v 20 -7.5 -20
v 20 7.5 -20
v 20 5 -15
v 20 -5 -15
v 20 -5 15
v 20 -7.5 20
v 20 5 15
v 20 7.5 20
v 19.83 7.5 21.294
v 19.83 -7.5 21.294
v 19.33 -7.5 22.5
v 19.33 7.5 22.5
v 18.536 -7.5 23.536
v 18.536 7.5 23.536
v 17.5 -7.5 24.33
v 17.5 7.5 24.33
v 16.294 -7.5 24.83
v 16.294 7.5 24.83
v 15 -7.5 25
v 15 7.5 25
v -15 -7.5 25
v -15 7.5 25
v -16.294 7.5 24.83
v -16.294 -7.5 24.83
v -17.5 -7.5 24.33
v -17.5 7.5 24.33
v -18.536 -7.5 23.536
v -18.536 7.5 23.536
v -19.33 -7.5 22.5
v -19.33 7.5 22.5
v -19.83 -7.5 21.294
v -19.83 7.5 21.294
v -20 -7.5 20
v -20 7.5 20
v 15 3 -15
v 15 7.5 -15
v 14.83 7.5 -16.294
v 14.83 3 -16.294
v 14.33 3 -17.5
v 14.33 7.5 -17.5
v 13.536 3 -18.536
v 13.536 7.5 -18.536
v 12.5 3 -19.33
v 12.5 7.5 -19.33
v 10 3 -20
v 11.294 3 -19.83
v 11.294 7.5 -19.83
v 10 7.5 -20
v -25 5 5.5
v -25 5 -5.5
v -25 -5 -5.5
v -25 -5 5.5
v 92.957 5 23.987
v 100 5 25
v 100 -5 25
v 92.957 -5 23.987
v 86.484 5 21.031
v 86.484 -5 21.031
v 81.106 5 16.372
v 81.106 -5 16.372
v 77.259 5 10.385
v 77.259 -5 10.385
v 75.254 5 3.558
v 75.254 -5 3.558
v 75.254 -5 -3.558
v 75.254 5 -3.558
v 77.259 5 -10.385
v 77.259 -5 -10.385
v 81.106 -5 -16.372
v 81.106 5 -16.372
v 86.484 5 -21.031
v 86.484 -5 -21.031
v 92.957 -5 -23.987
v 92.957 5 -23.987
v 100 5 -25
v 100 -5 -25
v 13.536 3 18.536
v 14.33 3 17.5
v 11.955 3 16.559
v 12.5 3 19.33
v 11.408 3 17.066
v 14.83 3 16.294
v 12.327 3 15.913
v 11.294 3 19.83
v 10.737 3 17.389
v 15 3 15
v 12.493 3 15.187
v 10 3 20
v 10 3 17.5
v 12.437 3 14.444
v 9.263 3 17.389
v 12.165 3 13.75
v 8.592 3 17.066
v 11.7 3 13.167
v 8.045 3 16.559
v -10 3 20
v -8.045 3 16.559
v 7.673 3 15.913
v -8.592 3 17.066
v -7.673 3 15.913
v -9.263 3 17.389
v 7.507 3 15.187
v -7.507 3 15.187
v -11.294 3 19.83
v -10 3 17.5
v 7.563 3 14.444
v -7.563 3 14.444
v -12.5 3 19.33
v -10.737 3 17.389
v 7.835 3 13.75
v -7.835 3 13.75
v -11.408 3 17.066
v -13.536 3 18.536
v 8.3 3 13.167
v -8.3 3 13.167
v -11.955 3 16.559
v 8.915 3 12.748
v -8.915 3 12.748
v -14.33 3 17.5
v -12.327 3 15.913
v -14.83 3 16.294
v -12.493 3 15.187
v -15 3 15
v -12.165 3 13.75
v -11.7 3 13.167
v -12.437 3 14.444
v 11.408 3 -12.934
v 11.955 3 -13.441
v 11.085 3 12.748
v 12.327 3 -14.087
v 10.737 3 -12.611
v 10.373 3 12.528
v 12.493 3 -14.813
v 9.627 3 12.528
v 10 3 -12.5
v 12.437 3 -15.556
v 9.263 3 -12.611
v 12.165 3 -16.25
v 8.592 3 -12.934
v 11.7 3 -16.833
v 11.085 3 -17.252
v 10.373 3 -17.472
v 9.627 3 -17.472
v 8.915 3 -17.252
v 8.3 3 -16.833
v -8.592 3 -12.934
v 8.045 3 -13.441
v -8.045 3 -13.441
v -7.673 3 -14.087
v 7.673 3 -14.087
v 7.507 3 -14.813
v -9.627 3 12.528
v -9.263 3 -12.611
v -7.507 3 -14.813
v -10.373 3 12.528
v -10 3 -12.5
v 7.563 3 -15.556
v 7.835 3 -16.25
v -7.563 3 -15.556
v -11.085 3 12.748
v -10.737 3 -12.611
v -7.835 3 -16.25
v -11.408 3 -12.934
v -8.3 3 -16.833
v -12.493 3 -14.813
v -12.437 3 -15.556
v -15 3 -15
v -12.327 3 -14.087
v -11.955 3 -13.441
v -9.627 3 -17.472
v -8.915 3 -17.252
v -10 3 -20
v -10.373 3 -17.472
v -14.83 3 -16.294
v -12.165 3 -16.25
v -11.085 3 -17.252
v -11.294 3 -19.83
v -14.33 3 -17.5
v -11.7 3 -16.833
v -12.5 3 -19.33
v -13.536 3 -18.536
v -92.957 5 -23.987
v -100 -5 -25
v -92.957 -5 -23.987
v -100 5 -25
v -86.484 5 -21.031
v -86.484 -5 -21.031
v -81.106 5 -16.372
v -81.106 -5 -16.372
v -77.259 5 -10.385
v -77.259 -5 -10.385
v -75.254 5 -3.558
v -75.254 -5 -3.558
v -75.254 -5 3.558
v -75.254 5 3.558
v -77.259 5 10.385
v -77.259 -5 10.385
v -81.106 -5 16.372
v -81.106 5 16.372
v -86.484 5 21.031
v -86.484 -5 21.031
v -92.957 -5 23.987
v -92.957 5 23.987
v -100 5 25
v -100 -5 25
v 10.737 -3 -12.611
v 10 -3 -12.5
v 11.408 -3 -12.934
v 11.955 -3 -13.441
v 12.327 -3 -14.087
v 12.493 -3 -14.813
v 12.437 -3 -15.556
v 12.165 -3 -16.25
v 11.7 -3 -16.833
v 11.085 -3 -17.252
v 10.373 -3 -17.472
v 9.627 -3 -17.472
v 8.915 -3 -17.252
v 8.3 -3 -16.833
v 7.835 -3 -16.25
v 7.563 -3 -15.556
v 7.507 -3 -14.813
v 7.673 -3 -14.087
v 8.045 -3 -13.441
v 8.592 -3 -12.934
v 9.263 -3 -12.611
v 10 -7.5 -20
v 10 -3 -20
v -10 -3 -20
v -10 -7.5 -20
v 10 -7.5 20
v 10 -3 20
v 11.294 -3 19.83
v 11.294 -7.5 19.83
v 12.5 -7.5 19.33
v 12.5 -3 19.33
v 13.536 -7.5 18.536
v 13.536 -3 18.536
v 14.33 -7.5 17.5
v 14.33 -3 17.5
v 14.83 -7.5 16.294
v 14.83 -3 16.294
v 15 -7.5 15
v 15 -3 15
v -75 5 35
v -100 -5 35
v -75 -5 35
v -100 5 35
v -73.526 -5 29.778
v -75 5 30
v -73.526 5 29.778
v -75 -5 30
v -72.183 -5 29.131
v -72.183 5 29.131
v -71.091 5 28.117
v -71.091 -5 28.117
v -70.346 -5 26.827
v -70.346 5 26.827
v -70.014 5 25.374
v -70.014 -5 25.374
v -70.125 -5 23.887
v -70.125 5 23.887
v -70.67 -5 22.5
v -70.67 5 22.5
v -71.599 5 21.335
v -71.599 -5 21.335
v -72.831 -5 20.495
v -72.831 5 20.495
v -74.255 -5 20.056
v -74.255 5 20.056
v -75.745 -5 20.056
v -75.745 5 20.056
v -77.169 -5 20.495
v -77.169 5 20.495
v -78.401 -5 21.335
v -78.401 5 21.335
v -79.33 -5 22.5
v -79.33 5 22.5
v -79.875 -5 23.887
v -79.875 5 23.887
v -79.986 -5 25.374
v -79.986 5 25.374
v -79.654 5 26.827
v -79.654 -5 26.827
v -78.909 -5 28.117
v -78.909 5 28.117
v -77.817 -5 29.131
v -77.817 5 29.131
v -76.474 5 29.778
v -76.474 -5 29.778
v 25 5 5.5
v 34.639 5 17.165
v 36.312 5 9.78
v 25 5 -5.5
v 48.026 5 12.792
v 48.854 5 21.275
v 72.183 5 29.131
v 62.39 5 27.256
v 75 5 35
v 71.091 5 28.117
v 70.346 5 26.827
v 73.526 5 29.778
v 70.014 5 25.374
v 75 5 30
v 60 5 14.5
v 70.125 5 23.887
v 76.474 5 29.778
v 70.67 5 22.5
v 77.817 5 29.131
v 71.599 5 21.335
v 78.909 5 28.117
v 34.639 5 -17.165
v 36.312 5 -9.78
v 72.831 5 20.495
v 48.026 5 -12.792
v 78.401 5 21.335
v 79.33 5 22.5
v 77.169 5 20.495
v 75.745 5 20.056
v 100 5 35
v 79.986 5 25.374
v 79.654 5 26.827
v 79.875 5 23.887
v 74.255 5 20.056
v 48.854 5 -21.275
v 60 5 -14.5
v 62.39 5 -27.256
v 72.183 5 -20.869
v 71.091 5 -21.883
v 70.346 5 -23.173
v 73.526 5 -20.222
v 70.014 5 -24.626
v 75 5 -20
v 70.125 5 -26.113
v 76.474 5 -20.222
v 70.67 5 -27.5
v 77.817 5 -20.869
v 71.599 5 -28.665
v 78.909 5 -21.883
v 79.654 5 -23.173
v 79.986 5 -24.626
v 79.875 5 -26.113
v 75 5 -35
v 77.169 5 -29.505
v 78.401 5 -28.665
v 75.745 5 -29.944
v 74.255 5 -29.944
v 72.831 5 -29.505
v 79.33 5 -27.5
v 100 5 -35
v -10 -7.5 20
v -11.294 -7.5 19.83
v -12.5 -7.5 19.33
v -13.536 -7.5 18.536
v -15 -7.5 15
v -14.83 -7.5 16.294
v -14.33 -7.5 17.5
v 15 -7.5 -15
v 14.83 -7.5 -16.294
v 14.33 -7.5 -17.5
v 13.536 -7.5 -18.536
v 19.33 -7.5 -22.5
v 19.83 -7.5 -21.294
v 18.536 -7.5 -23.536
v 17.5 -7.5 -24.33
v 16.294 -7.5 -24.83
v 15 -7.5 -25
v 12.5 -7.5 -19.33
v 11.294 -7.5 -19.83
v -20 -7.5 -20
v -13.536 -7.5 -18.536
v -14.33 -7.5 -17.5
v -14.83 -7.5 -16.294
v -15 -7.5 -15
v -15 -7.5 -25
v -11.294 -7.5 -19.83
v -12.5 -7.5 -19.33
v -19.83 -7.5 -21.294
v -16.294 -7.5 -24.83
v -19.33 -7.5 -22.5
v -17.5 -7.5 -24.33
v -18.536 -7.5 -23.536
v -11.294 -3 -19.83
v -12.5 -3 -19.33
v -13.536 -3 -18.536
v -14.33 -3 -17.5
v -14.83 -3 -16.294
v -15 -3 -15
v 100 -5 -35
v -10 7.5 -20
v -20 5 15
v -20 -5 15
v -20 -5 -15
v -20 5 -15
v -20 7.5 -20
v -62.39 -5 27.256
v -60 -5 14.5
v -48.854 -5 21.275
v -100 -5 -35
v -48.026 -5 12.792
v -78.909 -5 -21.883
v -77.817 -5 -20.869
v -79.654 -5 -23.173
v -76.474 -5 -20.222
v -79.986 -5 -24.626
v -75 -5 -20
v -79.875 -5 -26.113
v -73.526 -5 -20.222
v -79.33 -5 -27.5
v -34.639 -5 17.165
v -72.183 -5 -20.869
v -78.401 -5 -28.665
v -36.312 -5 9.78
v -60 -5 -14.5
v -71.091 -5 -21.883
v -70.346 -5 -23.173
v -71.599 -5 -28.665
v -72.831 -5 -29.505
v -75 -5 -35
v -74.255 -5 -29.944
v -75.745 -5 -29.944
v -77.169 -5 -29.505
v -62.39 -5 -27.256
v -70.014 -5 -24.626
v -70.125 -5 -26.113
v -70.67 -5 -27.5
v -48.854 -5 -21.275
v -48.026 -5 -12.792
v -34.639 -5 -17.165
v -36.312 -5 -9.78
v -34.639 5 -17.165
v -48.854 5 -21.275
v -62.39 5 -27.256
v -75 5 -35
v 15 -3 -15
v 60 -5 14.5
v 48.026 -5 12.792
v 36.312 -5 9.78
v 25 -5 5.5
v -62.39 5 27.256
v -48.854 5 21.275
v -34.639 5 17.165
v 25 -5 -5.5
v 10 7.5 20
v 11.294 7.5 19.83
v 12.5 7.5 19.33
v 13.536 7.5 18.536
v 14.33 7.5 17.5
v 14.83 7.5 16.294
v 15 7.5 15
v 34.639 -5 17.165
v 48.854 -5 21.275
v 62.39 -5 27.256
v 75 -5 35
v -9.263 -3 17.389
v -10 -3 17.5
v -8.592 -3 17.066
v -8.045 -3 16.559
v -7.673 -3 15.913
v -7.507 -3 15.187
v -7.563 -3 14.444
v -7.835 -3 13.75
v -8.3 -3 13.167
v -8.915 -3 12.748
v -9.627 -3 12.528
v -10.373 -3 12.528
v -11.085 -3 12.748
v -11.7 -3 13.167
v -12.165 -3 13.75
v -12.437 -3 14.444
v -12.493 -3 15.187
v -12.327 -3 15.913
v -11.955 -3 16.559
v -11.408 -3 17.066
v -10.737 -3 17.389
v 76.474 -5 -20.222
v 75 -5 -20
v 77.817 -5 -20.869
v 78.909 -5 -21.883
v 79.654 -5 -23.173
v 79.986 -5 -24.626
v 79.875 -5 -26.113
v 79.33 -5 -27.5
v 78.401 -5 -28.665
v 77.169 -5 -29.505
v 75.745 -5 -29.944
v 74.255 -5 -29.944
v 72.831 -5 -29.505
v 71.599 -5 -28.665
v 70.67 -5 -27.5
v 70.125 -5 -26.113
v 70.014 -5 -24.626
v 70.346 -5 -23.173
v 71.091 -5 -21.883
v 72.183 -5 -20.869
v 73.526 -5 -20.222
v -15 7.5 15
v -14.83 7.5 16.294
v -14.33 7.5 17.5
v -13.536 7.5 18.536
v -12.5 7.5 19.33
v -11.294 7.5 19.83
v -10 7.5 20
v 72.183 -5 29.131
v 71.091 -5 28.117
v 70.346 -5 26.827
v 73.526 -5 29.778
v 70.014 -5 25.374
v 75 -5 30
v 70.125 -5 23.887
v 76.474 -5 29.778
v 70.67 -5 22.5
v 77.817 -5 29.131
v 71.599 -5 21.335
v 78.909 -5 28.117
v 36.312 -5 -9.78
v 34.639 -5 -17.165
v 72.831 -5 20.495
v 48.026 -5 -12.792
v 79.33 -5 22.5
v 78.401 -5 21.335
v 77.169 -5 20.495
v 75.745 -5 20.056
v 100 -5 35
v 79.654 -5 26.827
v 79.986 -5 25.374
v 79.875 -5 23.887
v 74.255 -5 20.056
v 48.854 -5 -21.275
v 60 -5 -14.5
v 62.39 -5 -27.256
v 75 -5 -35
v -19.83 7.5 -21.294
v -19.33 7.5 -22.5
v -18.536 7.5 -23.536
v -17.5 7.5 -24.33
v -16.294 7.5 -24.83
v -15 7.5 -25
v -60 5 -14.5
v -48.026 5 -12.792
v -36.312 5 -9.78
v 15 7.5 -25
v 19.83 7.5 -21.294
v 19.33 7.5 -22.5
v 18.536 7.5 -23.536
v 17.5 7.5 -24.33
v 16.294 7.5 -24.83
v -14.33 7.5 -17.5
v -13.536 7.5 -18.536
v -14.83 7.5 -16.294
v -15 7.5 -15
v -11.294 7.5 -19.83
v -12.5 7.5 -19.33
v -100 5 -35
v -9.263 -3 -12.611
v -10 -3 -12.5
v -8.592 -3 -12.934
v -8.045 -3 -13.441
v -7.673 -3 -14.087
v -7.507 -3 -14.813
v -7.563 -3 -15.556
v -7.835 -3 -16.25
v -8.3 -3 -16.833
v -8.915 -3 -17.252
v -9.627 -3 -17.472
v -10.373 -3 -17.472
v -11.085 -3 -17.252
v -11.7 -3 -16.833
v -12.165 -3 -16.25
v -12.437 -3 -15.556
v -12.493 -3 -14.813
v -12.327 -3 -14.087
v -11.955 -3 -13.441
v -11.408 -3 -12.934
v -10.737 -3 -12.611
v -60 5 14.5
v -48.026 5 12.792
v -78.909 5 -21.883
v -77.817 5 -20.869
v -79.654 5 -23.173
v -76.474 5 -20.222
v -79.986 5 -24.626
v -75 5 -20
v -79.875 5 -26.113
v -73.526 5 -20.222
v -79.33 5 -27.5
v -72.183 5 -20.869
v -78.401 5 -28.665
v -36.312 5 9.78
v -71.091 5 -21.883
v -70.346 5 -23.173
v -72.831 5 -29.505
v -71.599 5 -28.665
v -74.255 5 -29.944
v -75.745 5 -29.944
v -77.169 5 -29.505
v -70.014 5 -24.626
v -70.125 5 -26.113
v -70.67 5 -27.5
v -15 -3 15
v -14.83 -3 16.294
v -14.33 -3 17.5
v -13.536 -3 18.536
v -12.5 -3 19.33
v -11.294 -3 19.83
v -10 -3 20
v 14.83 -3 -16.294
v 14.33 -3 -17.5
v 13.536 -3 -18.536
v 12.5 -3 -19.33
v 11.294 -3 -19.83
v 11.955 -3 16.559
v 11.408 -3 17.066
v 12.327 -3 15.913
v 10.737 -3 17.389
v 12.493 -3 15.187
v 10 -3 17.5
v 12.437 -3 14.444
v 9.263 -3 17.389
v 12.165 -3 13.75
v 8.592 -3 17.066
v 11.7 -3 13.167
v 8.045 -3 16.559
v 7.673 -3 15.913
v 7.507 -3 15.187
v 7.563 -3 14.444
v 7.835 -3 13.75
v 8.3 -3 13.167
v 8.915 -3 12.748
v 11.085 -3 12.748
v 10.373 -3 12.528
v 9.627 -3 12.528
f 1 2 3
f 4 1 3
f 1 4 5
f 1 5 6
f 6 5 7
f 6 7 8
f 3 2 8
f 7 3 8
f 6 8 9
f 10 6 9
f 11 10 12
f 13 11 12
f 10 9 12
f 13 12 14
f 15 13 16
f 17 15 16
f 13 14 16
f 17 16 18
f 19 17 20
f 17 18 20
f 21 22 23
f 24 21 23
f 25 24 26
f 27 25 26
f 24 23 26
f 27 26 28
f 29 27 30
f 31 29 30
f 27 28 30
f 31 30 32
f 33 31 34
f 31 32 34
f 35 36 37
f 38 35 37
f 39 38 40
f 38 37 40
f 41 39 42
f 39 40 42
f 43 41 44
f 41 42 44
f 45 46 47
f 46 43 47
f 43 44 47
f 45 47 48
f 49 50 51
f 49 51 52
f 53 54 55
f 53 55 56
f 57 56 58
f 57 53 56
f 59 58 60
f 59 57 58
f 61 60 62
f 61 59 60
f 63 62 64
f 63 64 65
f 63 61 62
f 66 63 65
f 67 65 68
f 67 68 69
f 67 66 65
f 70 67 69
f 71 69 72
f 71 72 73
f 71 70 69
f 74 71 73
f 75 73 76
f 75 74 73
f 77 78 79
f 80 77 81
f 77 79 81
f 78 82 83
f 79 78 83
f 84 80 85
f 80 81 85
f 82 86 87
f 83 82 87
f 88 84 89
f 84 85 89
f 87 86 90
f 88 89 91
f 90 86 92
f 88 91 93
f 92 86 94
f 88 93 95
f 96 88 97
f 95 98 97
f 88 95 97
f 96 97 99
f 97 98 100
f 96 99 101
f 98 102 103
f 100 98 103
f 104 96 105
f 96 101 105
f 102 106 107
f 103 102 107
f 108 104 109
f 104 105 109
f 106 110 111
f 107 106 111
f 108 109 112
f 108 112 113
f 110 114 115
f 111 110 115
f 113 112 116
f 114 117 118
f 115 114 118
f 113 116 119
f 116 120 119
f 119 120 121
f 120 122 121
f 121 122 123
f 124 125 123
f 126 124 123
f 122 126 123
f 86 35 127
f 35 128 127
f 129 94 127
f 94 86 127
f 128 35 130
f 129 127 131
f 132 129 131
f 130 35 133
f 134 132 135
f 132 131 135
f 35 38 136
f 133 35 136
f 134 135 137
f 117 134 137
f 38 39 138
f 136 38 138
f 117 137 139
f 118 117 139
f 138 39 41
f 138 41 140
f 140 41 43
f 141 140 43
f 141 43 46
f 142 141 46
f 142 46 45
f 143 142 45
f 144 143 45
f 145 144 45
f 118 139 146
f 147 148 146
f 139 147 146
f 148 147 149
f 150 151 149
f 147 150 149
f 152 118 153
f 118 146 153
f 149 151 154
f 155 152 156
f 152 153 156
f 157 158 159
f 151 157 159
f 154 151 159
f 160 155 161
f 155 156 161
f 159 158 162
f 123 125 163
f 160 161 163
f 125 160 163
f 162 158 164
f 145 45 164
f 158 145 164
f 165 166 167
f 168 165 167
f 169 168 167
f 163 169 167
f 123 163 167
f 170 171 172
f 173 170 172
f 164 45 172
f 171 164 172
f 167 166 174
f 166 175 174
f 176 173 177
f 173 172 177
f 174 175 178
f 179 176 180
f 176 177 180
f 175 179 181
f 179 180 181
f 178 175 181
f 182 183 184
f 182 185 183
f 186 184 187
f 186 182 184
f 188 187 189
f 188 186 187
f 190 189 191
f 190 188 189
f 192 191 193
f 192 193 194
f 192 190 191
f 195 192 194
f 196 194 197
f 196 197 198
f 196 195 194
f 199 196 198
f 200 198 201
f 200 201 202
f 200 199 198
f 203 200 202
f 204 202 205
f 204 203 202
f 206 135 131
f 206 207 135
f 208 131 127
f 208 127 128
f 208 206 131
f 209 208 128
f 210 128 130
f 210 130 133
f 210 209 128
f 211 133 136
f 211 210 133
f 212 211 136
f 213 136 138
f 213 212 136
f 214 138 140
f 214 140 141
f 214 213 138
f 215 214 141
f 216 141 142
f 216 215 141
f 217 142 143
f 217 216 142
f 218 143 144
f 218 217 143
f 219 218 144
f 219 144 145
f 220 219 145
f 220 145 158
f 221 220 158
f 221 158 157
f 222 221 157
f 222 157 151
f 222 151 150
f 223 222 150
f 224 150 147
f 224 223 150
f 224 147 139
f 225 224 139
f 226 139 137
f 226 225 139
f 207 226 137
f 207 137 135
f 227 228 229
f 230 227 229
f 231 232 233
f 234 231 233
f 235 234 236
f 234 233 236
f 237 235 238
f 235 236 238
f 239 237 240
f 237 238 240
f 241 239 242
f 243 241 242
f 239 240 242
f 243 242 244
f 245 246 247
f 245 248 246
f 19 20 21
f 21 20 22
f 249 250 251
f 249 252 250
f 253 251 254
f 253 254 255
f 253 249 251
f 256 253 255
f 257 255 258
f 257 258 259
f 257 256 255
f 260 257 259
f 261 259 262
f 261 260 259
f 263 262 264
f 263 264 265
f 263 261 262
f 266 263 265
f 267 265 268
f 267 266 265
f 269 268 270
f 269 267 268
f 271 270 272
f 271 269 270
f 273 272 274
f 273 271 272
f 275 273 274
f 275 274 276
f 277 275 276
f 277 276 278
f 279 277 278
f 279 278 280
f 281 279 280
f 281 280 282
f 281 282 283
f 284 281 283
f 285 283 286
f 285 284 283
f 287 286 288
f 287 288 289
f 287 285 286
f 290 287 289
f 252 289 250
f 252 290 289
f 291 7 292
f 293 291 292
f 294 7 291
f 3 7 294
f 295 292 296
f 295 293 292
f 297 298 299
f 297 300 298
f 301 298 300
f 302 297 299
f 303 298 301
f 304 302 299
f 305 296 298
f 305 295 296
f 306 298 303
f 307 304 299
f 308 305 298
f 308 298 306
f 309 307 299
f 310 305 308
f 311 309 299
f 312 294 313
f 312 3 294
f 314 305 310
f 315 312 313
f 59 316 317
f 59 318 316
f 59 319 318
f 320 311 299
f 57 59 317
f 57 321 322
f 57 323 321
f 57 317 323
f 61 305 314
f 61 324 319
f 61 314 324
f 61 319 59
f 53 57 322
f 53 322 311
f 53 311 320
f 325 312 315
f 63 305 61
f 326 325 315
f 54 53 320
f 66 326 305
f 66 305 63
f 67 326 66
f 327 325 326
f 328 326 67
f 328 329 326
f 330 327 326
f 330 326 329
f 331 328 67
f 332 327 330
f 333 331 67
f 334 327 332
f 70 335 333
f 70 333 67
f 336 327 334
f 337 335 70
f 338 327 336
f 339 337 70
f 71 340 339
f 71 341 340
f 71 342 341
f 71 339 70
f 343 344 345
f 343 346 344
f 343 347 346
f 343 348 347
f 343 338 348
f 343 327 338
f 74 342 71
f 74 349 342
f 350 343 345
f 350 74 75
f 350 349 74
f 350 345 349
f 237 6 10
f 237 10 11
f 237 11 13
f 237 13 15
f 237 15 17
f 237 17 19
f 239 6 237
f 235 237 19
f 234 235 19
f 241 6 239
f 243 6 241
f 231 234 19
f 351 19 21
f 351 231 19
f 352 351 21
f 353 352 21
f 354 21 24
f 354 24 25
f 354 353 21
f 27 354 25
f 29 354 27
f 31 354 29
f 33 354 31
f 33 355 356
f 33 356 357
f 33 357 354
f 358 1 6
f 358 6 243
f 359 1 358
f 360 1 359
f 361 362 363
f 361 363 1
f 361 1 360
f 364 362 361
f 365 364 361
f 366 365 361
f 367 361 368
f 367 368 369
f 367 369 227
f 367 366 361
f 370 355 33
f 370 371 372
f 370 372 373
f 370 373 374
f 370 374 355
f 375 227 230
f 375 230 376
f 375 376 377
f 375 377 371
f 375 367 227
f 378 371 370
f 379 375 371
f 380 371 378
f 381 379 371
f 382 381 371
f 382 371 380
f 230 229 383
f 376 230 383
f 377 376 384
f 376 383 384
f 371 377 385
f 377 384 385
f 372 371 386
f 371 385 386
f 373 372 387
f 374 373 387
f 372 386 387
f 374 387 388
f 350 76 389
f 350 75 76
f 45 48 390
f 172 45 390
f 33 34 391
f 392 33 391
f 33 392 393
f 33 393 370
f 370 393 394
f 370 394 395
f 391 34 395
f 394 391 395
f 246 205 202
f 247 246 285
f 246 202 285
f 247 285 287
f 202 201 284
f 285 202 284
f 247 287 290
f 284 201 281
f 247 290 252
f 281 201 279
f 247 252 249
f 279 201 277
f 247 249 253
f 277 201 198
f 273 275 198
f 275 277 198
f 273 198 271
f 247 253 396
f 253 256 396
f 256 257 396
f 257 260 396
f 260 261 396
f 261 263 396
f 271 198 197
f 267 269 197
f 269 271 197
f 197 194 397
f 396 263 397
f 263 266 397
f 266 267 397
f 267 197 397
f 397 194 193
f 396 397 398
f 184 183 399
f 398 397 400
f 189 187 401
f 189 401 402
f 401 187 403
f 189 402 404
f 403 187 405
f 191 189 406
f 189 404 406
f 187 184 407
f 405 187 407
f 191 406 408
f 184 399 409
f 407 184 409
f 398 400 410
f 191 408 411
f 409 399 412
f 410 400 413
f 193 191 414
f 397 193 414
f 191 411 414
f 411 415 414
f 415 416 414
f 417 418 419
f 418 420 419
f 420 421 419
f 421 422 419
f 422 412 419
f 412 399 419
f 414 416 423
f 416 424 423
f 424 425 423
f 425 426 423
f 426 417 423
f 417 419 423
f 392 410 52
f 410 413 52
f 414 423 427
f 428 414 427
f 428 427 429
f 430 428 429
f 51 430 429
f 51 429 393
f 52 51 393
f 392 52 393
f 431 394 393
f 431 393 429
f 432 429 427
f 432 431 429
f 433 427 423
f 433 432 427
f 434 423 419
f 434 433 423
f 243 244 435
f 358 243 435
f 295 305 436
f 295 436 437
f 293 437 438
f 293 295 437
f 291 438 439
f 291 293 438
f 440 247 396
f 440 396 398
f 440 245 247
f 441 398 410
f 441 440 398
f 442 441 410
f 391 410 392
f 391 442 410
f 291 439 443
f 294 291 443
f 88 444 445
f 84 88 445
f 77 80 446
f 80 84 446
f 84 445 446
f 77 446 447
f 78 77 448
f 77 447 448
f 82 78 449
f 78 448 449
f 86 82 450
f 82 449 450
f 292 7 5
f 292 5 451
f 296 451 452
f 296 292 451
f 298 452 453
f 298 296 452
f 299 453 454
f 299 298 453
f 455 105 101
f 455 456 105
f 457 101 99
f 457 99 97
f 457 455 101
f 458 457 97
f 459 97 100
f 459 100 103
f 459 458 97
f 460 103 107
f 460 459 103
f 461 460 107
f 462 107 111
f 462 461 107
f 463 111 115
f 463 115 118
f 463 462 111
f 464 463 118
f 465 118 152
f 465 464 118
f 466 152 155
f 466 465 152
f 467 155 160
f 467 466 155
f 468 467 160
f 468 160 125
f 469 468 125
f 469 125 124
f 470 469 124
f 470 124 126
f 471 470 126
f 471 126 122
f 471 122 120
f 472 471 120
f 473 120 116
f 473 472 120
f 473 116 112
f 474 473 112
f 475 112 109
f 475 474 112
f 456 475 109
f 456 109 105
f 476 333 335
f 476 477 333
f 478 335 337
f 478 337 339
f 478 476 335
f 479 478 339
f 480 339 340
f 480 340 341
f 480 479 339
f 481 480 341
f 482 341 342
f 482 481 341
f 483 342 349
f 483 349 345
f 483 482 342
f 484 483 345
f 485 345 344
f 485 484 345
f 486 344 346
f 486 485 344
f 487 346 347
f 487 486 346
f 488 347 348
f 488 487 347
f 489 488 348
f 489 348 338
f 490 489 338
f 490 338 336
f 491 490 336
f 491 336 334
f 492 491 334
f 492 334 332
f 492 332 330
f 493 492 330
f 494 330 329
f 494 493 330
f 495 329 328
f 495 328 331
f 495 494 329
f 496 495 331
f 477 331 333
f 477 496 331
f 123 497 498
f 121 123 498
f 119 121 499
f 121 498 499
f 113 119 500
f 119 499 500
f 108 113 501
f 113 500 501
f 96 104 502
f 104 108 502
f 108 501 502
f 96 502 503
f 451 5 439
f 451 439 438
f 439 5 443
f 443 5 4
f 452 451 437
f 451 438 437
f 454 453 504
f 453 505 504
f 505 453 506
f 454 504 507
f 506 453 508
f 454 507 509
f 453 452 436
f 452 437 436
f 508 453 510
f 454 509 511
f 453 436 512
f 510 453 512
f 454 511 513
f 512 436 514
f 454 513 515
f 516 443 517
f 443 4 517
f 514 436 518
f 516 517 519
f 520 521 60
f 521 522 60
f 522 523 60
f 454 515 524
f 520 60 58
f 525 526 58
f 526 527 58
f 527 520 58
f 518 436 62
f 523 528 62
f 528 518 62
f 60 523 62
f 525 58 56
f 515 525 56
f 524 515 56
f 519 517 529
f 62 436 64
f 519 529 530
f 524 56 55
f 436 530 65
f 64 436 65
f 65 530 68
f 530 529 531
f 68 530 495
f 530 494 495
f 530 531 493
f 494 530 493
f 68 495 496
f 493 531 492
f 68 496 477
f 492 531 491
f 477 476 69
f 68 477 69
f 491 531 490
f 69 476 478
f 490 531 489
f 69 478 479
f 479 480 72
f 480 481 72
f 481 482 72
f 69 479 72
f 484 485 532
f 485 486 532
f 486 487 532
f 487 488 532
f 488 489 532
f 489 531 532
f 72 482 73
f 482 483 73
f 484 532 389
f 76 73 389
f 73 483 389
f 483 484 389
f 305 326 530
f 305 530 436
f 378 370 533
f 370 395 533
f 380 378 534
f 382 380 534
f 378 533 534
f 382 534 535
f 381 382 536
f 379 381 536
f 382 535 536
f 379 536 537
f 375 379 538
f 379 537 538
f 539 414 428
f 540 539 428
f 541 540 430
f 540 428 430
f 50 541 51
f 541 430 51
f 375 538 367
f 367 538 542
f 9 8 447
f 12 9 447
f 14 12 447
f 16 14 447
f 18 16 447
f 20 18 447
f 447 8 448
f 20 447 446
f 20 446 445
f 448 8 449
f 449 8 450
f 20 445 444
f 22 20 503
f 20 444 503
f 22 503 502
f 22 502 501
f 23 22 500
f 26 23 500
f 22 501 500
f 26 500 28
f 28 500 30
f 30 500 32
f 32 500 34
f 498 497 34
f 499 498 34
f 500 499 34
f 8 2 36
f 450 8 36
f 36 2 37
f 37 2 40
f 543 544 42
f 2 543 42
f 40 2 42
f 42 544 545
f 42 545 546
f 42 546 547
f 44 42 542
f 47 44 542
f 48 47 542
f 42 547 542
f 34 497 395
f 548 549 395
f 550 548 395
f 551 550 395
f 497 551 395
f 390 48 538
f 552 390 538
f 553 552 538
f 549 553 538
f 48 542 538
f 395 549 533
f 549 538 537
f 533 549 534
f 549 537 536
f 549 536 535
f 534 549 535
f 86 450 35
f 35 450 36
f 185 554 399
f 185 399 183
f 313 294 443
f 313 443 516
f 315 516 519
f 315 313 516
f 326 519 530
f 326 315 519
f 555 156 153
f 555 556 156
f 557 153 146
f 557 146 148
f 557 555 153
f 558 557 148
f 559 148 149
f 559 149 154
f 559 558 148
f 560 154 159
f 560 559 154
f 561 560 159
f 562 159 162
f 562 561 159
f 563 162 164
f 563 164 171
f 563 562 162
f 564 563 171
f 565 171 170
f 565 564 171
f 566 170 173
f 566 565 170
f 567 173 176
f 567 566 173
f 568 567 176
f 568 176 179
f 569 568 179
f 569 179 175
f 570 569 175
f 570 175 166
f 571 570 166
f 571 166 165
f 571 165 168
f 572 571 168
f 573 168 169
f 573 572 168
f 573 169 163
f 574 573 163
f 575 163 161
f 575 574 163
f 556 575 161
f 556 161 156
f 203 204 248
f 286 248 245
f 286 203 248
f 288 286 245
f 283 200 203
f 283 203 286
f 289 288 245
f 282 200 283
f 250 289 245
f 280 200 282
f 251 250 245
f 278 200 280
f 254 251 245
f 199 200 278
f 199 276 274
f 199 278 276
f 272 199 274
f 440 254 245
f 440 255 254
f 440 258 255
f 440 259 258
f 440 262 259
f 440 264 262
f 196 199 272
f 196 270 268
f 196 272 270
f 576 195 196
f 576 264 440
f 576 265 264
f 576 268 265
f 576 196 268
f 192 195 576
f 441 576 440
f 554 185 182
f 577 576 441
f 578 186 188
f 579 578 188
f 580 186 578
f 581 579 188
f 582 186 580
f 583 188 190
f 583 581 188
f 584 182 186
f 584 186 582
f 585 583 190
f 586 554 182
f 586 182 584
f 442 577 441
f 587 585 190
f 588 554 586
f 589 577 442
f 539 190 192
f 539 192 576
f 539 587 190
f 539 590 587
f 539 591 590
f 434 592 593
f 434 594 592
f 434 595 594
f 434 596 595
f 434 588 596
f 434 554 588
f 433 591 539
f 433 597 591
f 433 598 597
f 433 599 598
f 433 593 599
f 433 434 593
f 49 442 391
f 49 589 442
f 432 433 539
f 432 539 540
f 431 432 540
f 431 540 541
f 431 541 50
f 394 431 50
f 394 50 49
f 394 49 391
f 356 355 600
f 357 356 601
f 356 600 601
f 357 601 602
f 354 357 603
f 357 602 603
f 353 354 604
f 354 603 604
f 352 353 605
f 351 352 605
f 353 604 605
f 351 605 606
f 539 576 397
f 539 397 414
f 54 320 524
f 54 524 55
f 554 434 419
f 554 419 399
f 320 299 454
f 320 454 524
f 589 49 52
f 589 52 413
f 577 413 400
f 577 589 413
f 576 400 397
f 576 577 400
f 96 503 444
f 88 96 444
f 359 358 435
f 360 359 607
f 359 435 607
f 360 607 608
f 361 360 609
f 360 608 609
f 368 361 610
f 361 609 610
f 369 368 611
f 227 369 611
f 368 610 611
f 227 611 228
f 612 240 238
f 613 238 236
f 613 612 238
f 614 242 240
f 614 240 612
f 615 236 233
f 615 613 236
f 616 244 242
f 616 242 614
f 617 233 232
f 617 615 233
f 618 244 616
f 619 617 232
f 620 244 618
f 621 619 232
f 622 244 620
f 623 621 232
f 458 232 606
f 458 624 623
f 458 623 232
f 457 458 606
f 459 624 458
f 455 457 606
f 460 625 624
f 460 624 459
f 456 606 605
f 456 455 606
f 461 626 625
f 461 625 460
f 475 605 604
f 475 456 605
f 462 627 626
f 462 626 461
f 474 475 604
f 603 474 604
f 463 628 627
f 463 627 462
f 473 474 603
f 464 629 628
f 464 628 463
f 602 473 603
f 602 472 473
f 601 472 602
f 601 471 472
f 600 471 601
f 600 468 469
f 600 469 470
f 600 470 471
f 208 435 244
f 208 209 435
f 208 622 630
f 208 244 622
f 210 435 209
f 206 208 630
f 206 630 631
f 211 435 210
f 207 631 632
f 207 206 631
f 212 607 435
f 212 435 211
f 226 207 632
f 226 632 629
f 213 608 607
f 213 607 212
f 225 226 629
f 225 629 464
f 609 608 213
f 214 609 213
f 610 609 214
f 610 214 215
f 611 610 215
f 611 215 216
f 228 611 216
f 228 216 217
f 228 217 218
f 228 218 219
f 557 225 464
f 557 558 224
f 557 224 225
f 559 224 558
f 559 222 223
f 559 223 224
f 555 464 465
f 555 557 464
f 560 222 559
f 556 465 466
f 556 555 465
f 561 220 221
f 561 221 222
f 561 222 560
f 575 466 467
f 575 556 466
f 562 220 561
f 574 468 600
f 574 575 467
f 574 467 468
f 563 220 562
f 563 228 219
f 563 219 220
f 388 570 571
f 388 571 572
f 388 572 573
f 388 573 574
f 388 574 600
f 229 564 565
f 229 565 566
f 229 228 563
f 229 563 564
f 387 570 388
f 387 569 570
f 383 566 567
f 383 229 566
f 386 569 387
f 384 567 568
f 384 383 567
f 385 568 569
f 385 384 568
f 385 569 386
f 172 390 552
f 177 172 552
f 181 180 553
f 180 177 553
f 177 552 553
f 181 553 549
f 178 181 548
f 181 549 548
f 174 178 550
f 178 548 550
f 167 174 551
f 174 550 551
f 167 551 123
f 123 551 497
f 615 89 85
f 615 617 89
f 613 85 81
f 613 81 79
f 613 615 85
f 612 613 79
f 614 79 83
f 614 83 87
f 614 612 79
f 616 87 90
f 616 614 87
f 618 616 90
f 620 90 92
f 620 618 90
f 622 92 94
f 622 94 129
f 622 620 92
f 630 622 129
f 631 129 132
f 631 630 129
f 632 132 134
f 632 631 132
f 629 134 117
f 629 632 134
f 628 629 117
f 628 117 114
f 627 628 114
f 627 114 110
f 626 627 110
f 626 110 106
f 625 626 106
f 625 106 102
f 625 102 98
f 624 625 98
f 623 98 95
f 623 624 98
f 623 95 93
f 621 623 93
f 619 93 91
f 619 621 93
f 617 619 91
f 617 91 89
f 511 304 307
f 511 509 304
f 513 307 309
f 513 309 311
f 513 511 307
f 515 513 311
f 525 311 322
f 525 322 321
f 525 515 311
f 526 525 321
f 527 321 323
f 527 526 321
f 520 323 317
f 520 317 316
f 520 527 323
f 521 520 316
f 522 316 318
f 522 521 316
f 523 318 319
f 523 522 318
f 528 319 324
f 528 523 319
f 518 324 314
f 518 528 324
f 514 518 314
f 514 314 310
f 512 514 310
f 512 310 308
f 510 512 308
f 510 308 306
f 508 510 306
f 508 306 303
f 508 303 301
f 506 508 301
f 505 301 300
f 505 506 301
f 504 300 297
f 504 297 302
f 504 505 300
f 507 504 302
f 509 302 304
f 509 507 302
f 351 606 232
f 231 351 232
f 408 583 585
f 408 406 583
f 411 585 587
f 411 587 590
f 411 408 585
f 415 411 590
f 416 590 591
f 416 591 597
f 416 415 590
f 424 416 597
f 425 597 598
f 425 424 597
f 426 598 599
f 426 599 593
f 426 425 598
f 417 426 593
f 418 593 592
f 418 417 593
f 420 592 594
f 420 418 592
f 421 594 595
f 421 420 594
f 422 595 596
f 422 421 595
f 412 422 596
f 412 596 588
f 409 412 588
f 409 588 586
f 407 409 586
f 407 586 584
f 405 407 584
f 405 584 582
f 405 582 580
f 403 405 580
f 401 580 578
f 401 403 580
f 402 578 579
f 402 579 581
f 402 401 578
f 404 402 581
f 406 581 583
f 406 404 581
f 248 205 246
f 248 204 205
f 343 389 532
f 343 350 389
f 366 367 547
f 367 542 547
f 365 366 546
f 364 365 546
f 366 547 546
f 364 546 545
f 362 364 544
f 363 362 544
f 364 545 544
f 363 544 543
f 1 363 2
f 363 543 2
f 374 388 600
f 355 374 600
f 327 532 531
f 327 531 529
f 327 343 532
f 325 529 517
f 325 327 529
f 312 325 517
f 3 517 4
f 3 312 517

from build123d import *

# Parameters (mm, degrees)
SKETCH1_R             = 5
BOSS_EXTRUDE1_DEPTH   = 5
BOSS_EXTRUDE1_2_DEPTH = 5
SKETCH1_3_R           = 2.5
BOSS_EXTRUDE2_DEPTH   = 3
BOSS_EXTRUDE3_DEPTH   = 7.5


with BuildPart() as part:
    # Sketch1 → Boss-Extrude1 (new, symmetric)
    with BuildSketch(Plane(origin=(0, 0, 0), x_dir=(1, 0, 0), z_dir=(0, 1, 0))):
        with BuildLine():
            ThreePointArc((-75, -35), (-48.85448144, -21.27517604), (-20, -15))
            Line((-20, -15), (-20, 15))
            ThreePointArc((-20, 15), (-48.85448144, 21.27517604), (-75, 35))
            Line((-75, 35), (-100, 35))
            Line((-100, 35), (-100, 25))
            ThreePointArc((-100, 25), (-75, 0), (-100, -25))
            Line((-100, -25), (-100, -35))
            Line((-100, -35), (-75, -35))
        make_face()
        with Locations(Location((-75, -25, 0), (0, 0, 270))):
            Circle(SKETCH1_R, mode=Mode.SUBTRACT)
        with BuildLine():
            Line((-60, -14.5), (-60, 14.5))
            ThreePointArc((-60, 14.5), (-42.12787297, 11.447160671), (-25, 5.5))
            Line((-25, 5.5), (-25, -5.5))
            ThreePointArc((-25, -5.5), (-42.12787297, -11.447160671), (-60, -14.5))
        make_face(mode=Mode.SUBTRACT)
        with Locations(Location((-75, 25, 0), (0, 0, 270))):
            Circle(SKETCH1_R, mode=Mode.SUBTRACT)
    extrude(amount=BOSS_EXTRUDE1_DEPTH, both=True)



with BuildPart() as body_2:
    # Sketch1 → Boss-Extrude1 2 (new, symmetric)
    with BuildSketch(Plane(origin=(0, 0, 0), x_dir=(1, 0, 0), z_dir=(0, 1, 0))):
        with BuildLine():
            Line((20, 15), (20, -15))
            ThreePointArc((20, -15), (48.85448144, -21.27517604), (75, -35))
            Line((75, -35), (100, -35))
            Line((100, -35), (100, -25))
            ThreePointArc((100, -25), (75, 0), (100, 25))
            Line((100, 25), (100, 35))
            Line((100, 35), (75, 35))
            ThreePointArc((75, 35), (48.85448144, 21.27517604), (20, 15))
        make_face()
        with Locations(Location((75, -25, 0), (0, 0, 270))):
            Circle(SKETCH1_R, mode=Mode.SUBTRACT)
        with BuildLine():
            ThreePointArc((60, -14.5), (42.12787297, -11.447160671), (25, -5.5))
            Line((25, -5.5), (25, 5.5))
            ThreePointArc((25, 5.5), (42.12787297, 11.447160671), (60, 14.5))
            Line((60, 14.5), (60, -14.5))
        make_face(mode=Mode.SUBTRACT)
        with Locations(Location((75, 25, 0), (0, 0, 270))):
            Circle(SKETCH1_R, mode=Mode.SUBTRACT)
    extrude(amount=BOSS_EXTRUDE1_2_DEPTH, both=True)


with BuildPart() as body_3:
    # Sketch1<3> → Boss-Extrude2 (new, symmetric)
    with BuildSketch(Plane(origin=(0, 0, 0), x_dir=(1, 0, 0), z_dir=(0, 1, 0))):
        with BuildLine():
            Line((15, 15), (15, -15))
            ThreePointArc((15, -15), (13.535533906, -18.535533906), (10, -20))
            Line((10, -20), (-10, -20))
            ThreePointArc((-10, -20), (-13.535533906, -18.535533906), (-15, -15))
            Line((-15, -15), (-15, 15))
            ThreePointArc((-15, 15), (-13.535533906, 18.535533906), (-10, 20))
            Line((-10, 20), (10, 20))
            ThreePointArc((10, 20), (13.535533906, 18.535533906), (15, 15))
        make_face()
        with Locations(Location((10, 15, 0), (0, 0, 270))):
            Circle(SKETCH1_3_R, mode=Mode.SUBTRACT)
        with Locations(Location((-10, 15, 0), (0, 0, 270))):
            Circle(SKETCH1_3_R, mode=Mode.SUBTRACT)
        with Locations(Location((-10, -15, 0), (0, 0, 270))):
            Circle(SKETCH1_3_R, mode=Mode.SUBTRACT)
        with Locations(Location((10, -15, 0), (0, 0, 270))):
            Circle(SKETCH1_3_R, mode=Mode.SUBTRACT)
    extrude(amount=BOSS_EXTRUDE2_DEPTH, both=True)


with BuildPart() as part_1:
    add(part.part)

    add(body_2.part)  # Boss-Extrude3 merges body 2

    add(body_3.part)  # Boss-Extrude3 merges body 3
    # Sketch1<4> → Boss-Extrude3 (add, symmetric)
    with BuildSketch(Plane(origin=(0, 0, 0), x_dir=(1, 0, 0), z_dir=(0, 1, 0))):
        with BuildLine():
            ThreePointArc((-15, -25), (-18.535533906, -23.535533906), (-20, -20))
            Line((-20, -20), (-20, 20))
            ThreePointArc((-20, 20), (-18.535533906, 23.535533906), (-15, 25))
            Line((-15, 25), (15, 25))
            ThreePointArc((15, 25), (18.535533906, 23.535533906), (20, 20))
            Line((20, 20), (20, -20))
            ThreePointArc((20, -20), (18.535533906, -23.535533906), (15, -25))
            Line((15, -25), (-15, -25))
        make_face()
        with BuildLine():
            ThreePointArc((15, 15), (13.535533906, 18.535533906), (10, 20))
            Line((10, 20), (-10, 20))
            ThreePointArc((-10, 20), (-13.535533906, 18.535533906), (-15, 15))
            Line((-15, 15), (-15, -15))
            ThreePointArc((-15, -15), (-13.535533906, -18.535533906), (-10, -20))
            Line((-10, -20), (10, -20))
            ThreePointArc((10, -20), (13.535533906, -18.535533906), (15, -15))
            Line((15, -15), (15, 15))
        make_face(mode=Mode.SUBTRACT)
    extrude(amount=BOSS_EXTRUDE3_DEPTH, both=True)


solid = part_1.part
